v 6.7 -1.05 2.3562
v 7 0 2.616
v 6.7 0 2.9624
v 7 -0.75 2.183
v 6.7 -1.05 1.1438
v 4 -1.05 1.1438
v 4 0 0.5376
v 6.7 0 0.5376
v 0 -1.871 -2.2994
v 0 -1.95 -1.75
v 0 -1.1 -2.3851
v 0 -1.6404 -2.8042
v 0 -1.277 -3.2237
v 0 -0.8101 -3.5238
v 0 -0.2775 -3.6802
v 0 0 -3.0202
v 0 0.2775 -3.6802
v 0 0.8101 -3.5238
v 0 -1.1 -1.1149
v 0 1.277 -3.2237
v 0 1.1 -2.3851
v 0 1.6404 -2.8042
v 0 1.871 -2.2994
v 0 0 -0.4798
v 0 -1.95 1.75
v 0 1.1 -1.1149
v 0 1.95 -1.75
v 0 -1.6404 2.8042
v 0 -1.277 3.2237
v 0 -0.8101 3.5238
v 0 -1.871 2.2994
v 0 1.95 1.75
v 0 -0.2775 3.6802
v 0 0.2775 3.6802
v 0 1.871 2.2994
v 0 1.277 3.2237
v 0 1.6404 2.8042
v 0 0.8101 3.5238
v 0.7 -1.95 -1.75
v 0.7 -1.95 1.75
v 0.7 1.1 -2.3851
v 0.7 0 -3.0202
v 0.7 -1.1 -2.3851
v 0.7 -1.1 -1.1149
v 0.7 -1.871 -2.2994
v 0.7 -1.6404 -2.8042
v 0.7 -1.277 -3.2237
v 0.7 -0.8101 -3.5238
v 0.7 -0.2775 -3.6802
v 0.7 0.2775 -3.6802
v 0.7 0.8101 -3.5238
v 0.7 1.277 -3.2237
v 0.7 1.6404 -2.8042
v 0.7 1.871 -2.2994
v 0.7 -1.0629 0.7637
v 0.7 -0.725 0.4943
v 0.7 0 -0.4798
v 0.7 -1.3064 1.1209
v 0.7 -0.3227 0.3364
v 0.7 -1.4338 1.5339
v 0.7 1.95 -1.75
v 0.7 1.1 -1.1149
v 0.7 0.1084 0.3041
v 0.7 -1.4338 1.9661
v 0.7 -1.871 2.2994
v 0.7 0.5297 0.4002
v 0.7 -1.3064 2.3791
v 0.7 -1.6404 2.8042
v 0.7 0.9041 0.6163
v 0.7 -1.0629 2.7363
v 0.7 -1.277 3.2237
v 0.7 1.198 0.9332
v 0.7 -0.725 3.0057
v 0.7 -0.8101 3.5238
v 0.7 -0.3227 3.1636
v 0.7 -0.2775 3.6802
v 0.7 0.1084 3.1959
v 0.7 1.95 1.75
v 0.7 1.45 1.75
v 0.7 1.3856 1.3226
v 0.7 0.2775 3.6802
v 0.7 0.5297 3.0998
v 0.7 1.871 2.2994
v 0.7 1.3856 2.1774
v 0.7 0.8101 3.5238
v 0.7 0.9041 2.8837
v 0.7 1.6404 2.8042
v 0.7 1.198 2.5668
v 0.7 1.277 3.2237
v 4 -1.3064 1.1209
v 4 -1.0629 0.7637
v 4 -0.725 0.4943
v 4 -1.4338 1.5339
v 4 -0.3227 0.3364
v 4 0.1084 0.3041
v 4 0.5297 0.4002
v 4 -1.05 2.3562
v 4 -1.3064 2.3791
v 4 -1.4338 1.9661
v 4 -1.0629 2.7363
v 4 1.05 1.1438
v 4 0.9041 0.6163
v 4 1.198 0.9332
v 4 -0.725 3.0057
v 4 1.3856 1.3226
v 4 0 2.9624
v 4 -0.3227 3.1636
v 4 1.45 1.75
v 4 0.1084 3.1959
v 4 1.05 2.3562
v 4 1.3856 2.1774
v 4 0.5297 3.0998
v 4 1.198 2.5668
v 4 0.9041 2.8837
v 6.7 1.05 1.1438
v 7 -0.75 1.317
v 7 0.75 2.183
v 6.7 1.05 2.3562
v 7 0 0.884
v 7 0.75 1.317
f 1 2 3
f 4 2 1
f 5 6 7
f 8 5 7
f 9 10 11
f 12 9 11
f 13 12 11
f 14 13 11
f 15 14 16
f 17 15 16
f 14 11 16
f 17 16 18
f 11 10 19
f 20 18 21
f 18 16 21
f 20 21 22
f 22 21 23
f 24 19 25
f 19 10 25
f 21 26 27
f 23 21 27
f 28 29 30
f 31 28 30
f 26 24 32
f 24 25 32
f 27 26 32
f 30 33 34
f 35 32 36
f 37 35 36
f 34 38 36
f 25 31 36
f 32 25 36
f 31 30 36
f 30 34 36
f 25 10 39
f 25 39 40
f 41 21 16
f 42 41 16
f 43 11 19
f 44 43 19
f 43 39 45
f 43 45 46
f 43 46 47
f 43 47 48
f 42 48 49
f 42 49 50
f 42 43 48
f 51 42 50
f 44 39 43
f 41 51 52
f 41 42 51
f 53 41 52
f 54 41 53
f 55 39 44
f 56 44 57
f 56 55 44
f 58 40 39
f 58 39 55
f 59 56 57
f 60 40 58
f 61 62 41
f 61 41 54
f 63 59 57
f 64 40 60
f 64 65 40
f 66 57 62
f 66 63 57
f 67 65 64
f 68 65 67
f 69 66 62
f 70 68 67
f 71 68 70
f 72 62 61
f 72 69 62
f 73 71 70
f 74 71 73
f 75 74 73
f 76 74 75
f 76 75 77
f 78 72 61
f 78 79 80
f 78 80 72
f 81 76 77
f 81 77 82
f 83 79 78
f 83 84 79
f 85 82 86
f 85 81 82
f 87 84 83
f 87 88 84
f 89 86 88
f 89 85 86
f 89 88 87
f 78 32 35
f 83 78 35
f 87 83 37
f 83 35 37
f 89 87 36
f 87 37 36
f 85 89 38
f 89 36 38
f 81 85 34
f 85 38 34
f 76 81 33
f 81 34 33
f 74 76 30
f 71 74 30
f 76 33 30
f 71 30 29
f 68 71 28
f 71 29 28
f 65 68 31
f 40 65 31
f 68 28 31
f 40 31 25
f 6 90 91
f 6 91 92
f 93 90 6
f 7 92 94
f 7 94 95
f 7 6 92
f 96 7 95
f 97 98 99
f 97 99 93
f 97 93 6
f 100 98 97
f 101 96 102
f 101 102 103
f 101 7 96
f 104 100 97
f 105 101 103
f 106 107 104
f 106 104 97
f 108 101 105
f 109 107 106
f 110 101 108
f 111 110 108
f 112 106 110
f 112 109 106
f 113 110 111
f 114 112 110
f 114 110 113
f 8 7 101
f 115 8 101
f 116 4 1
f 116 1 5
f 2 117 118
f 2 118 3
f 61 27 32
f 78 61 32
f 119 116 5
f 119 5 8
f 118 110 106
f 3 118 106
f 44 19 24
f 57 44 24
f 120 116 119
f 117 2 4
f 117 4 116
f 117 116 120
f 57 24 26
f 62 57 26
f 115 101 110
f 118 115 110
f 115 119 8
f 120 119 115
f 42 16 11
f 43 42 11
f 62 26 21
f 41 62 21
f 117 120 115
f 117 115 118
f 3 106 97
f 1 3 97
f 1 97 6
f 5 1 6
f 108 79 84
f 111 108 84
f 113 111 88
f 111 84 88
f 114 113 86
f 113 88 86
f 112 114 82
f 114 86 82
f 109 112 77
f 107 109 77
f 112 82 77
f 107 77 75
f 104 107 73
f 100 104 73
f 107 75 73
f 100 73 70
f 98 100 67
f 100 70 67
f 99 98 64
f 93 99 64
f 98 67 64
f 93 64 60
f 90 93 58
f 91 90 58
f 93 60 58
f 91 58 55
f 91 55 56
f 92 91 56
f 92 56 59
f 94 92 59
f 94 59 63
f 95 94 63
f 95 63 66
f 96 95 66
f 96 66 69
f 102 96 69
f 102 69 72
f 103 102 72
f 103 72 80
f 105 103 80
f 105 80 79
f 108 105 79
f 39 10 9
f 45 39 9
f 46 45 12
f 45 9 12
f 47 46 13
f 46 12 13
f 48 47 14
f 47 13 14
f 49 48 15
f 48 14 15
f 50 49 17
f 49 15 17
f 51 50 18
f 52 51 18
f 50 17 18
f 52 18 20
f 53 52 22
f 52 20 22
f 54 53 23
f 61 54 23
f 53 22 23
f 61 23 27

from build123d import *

# Parameters (mm, degrees)
F0_W     = 3.9
F0_H     = 3.5
F1_DEPTH = 0.7
F2_R     = 1.45
F3_DEPTH = 4
F5_DEPTH = 3
F6_SIZE  = 0.3
F8_DEPTH = 0.7


with BuildPart() as f1:
    # F0 (on Right) → F1 (new body)
    with BuildSketch(Plane.YZ):
        Rectangle(F0_W, F0_H)
        with BuildLine():
            Line((-1.95, 1.75), (1.95, 1.75))
            ThreePointArc((1.95, 1.75), (0, 3.7), (-1.95, 1.75))
        make_face()
        with BuildLine():
            ThreePointArc((-1.95, -1.75), (0, -3.7), (1.95, -1.75))
            Line((1.95, -1.75), (-1.95, -1.75))
        make_face()
    extrude(amount=F1_DEPTH)

    # F2 (on Right) → F3 (join)
    with BuildSketch(Plane.YZ):
        with Locations((0, 1.75)):
            Circle(F2_R)
    extrude(amount=F3_DEPTH)

    # F4 (on face) → F5 (join)
    with BuildSketch(Plane.YZ.offset(4)):
        Polygon((1.05, 1.143782), (1.05, 2.356218), (0, 2.962436), (-1.05, 2.356218), (-1.05, 1.143782), (0, 0.537564), align=None)
    extrude(amount=F5_DEPTH)

    # F6
    f6_edges = [f1.edges().sort_by_distance(p)[0] for p in [
        (7, -0.525, 2.659327),
        (7, 0.525, 2.659327),
        (7, 1.05, 1.75),
        (7, 0.525, 0.840673),
        (7, -0.525, 0.840673),
        (7, -1.05, 1.75),
    ]]
    chamfer(f6_edges, length=F6_SIZE)

    # F7 (on face) → F8 (cut, through all)
    with BuildSketch(Plane(origin=(0, 0, 0), x_dir=(0, -1, 0), z_dir=(-1, 0, 0))):
        Polygon((1.1, -2.385085), (1.1, -1.114915), (0, -0.479829), (-1.1, -1.114915), (-1.1, -2.385085), (0, -3.020171), align=None)
    extrude(amount=-F8_DEPTH, mode=Mode.SUBTRACT)


solid = f1.part
